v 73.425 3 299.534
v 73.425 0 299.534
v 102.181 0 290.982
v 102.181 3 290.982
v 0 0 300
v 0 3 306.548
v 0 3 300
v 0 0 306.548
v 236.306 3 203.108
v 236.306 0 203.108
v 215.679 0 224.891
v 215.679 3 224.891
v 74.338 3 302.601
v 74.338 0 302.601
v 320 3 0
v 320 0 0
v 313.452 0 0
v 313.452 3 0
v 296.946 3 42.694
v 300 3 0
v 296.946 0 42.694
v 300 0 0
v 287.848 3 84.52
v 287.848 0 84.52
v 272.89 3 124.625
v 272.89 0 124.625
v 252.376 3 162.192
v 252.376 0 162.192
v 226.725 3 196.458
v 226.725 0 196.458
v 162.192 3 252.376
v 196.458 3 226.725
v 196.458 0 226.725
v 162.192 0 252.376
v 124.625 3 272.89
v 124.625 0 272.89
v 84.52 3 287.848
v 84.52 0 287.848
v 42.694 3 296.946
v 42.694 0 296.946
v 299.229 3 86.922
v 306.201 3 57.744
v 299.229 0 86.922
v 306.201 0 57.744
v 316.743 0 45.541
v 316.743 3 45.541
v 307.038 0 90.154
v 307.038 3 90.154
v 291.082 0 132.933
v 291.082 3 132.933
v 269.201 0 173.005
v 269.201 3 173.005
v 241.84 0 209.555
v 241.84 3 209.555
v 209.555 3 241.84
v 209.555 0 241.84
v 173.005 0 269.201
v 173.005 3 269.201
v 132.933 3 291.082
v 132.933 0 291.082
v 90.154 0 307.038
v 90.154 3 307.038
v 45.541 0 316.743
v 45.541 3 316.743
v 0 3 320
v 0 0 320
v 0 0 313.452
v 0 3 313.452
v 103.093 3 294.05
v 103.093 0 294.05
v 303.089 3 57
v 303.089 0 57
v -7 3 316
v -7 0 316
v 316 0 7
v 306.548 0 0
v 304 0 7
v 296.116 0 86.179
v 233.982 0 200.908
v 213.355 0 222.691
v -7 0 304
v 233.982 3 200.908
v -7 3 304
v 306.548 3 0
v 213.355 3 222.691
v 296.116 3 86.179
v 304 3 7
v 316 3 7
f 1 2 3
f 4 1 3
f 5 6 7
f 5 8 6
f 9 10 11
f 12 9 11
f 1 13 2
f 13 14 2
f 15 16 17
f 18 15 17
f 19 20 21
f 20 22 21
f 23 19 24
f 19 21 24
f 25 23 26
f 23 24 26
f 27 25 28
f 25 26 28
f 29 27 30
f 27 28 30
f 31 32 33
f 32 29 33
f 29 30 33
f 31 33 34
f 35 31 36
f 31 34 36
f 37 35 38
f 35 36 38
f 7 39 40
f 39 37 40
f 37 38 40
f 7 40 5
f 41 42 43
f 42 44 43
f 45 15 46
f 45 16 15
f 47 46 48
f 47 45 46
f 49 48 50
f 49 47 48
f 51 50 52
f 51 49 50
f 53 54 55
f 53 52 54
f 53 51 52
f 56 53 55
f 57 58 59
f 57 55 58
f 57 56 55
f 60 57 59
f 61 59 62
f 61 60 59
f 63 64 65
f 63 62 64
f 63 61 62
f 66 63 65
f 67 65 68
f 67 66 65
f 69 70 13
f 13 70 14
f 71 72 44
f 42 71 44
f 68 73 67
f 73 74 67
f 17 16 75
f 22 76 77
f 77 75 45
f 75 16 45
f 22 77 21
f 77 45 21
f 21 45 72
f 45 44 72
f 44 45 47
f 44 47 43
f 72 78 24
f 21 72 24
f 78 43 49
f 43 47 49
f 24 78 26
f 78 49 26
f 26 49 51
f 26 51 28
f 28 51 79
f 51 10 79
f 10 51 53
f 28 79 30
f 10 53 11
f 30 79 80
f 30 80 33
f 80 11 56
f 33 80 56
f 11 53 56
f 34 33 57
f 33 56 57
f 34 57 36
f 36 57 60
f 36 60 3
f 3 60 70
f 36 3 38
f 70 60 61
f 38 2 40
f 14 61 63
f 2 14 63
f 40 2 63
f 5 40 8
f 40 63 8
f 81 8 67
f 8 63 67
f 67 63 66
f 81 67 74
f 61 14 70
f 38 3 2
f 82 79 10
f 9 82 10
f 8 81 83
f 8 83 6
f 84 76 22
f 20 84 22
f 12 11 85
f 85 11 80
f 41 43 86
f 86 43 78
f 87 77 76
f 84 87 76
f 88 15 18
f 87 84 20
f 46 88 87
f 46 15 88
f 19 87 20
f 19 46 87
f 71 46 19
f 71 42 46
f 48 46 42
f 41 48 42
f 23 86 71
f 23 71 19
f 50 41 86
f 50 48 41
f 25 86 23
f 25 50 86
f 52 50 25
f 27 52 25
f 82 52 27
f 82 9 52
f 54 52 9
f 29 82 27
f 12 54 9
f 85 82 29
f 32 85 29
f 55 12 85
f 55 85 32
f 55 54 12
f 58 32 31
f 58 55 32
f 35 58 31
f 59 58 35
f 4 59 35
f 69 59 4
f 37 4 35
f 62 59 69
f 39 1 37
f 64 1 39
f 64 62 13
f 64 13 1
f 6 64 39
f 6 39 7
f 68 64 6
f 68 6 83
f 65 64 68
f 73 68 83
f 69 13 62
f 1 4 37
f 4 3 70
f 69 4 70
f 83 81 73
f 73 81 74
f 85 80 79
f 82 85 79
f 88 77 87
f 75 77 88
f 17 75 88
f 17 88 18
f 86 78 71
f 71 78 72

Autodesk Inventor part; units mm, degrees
ref_plane "YZ Plane" through (0, 0, 0) normal (1, 0, 0) x (0, 1, 0)
ref_plane "XZ Plane" through (0, 0, 0) normal (0, 1, 0) x (-1, 0, 0)
ref_plane "XY Plane" through (0, 0, 0) normal (0, 0, 1) x (1, 0, 0)
sketch "Sketch1" plane through (0, 0, 0) normal (0, 1, 0) x (-1, 0, 0)
  circle A0 centre (0, 0) radius 300
  circle A1 centre (0, 0) radius 320
  line L0 (320, 0) -> (300, 0)
  line L1 (-320, 0) -> (-300, 0)
  line L2 (0, 0) -> (-300, 0) construction
  line L3 (0, 300) -> (0, 0) construction
  line L4 (0, 320) -> (0, 300)
  line L5 (-300, 0) -> (-320, 0)
  line L6 (-304, 7) -> (-316, 7)
  line L7 (-316, 7) -> (-313.4522, 0)
  line L8 (-304, 7) -> (-306.5478, 0)
  line L9 (-310, 0) -> (-310, 7) construction
  line L10 (-306.201, 57.7437) -> (-299.2289, 86.9223)
  line L11 (-299.2289, 86.9223) -> (-296.1165, 86.1786)
  line L12 (-296.1165, 86.1786) -> (-303.0886, 57)
  line L13 (-303.0886, 57) -> (-306.201, 57.7437)
  line L14 (-306.201, 57.7437) -> (-296.1165, 86.1786) construction
  line L15 (-299.2289, 86.9223) -> (-303.0886, 57) construction
  circle A2 centre (0, 0) radius 310 construction
  line L16 (-7, -304) -> (0, -306.5478)
  line L17 (-7, -316) -> (0, -313.4522)
  line L18 (-7, -304) -> (-7, -316)
  line L19 (304, -7) -> (306.5478, 0)
  line L20 (316, -7) -> (313.4522, 0)
  line L21 (304, -7) -> (316, -7)
  line L22 (7, 304) -> (0, 306.5478)
  line L23 (7, 316) -> (0, 313.4522)
  line L24 (7, 304) -> (7, 316)
  line L25 (-294.0497, -103.093) -> (-302.6009, -74.3375)
  line L26 (-290.9825, -102.1809) -> (-294.0497, -103.093)
  line L27 (-299.5337, -73.4254) -> (-290.9825, -102.1809)
  line L28 (-302.6009, -74.3375) -> (-299.5337, -73.4254)
  line L29 (-203.108, -236.306) -> (-224.8913, -215.6787)
  line L30 (-200.9078, -233.9825) -> (-203.108, -236.306)
  line L31 (-222.6911, -213.3551) -> (-200.9078, -233.9825)
  line L32 (-224.8913, -215.6787) -> (-222.6911, -213.3551)
  line L33 (-57.7437, -306.201) -> (-86.9223, -299.2289)
  line L34 (-57, -303.0886) -> (-57.7437, -306.201)
  line L35 (-86.1786, -296.1165) -> (-57, -303.0886)
  line L36 (-86.9223, -299.2289) -> (-86.1786, -296.1165)
  line L37 (103.093, -294.0497) -> (74.3375, -302.6009)
  line L38 (102.1809, -290.9825) -> (103.093, -294.0497)
  line L39 (73.4254, -299.5337) -> (102.1809, -290.9825)
  line L40 (74.3375, -302.6009) -> (73.4254, -299.5337)
  line L41 (236.306, -203.108) -> (215.6787, -224.8913)
  line L42 (233.9825, -200.9078) -> (236.306, -203.108)
  line L43 (213.3551, -222.6911) -> (233.9825, -200.9078)
  line L44 (215.6787, -224.8913) -> (213.3551, -222.6911)
  line L45 (306.201, -57.7437) -> (299.2289, -86.9223)
  line L46 (303.0886, -57) -> (306.201, -57.7437)
  line L47 (296.1165, -86.1786) -> (303.0886, -57)
  line L48 (299.2289, -86.9223) -> (296.1165, -86.1786)
  line L49 (294.0497, 103.093) -> (302.6009, 74.3375)
  line L50 (290.9825, 102.1809) -> (294.0497, 103.093)
  line L51 (299.5337, 73.4254) -> (290.9825, 102.1809)
  line L52 (302.6009, 74.3375) -> (299.5337, 73.4254)
  line L53 (203.108, 236.306) -> (224.8913, 215.6787)
  line L54 (200.9078, 233.9825) -> (203.108, 236.306)
  line L55 (222.6911, 213.3551) -> (200.9078, 233.9825)
  line L56 (224.8913, 215.6787) -> (222.6911, 213.3551)
  line L57 (57.7437, 306.201) -> (86.9223, 299.2289)
  line L58 (57, 303.0886) -> (57.7437, 306.201)
  line L59 (86.1786, 296.1165) -> (57, 303.0886)
  line L60 (86.9223, 299.2289) -> (86.1786, 296.1165)
  line L61 (-103.093, 294.0497) -> (-74.3375, 302.6009)
  line L62 (-102.1809, 290.9825) -> (-103.093, 294.0497)
  line L63 (-73.4254, 299.5337) -> (-102.1809, 290.9825)
  line L64 (-74.3375, 302.6009) -> (-73.4254, 299.5337)
  line L65 (-236.306, 203.108) -> (-215.6787, 224.8913)
  line L66 (-233.9825, 200.9078) -> (-236.306, 203.108)
  line L67 (-213.3551, 222.6911) -> (-233.9825, 200.9078)
  line L68 (-215.6787, 224.8913) -> (-213.3551, 222.6911)
  point P0 (310, 0)
  point P1 (-310, 0)
  point P2 (-301.1588, 71.9611)
  point P3 (-59.267, 304.2818)
  point P4 (-304.6448, 57.3718)
  point P5 (-297.6727, 86.5504)
  point P6 (-7, -310)
  point P7 (310, -7)
  point P8 (7, 310)
  point P9 (-292.5161, -102.6369)
  point P10 (-301.0673, -73.8815)
  point P11 (-202.0079, -235.1442)
  point P12 (-223.7912, -214.5169)
  point P13 (-57.3718, -304.6448)
  point P14 (-86.5504, -297.6727)
  point P15 (102.6369, -292.5161)
  point P16 (73.8815, -301.0673)
  point P17 (235.1442, -202.0079)
  point P18 (214.5169, -223.7912)
  point P19 (304.6448, -57.3718)
  point P20 (297.6727, -86.5504)
  point P21 (292.5161, 102.6369)
  point P22 (301.0673, 73.8815)
  point P23 (202.0079, 235.1442)
  point P24 (223.7912, 214.5169)
  point P25 (57.3718, 304.6448)
  point P26 (86.5504, 297.6727)
  point P27 (-102.6369, 292.5161)
  point P28 (-73.8815, 301.0673)
  point P29 (-235.1442, 202.0079)
  point P30 (-214.5169, 223.7912)
  point P31 (-306.5478, 0)
  point P32 (0, 306.5478)
  point P33 (0, 313.4522)
  point P34 (-313.4522, 0)
  dimension "d0" = 600
  dimension "d1" = 640
  dimension "d4" = 90
  dimension "d5" = 7
  dimension "d6" = 70
  dimension "d8" = 12
  dimension "d13" = 3.2
  dimension "d14" = 30
  dimension "d15" = 50
  dimension "d20" = 620
  dimension "d23" = 360
  dimension "d27" = 360
extrude "Extrusion1" add sketch "Sketch1" along normal blind 3 contours A0 L1 L8 L6 L7 A1 L4 | L4 L23 L24 L22
properties part number "R60_CM_CIRCULO"
